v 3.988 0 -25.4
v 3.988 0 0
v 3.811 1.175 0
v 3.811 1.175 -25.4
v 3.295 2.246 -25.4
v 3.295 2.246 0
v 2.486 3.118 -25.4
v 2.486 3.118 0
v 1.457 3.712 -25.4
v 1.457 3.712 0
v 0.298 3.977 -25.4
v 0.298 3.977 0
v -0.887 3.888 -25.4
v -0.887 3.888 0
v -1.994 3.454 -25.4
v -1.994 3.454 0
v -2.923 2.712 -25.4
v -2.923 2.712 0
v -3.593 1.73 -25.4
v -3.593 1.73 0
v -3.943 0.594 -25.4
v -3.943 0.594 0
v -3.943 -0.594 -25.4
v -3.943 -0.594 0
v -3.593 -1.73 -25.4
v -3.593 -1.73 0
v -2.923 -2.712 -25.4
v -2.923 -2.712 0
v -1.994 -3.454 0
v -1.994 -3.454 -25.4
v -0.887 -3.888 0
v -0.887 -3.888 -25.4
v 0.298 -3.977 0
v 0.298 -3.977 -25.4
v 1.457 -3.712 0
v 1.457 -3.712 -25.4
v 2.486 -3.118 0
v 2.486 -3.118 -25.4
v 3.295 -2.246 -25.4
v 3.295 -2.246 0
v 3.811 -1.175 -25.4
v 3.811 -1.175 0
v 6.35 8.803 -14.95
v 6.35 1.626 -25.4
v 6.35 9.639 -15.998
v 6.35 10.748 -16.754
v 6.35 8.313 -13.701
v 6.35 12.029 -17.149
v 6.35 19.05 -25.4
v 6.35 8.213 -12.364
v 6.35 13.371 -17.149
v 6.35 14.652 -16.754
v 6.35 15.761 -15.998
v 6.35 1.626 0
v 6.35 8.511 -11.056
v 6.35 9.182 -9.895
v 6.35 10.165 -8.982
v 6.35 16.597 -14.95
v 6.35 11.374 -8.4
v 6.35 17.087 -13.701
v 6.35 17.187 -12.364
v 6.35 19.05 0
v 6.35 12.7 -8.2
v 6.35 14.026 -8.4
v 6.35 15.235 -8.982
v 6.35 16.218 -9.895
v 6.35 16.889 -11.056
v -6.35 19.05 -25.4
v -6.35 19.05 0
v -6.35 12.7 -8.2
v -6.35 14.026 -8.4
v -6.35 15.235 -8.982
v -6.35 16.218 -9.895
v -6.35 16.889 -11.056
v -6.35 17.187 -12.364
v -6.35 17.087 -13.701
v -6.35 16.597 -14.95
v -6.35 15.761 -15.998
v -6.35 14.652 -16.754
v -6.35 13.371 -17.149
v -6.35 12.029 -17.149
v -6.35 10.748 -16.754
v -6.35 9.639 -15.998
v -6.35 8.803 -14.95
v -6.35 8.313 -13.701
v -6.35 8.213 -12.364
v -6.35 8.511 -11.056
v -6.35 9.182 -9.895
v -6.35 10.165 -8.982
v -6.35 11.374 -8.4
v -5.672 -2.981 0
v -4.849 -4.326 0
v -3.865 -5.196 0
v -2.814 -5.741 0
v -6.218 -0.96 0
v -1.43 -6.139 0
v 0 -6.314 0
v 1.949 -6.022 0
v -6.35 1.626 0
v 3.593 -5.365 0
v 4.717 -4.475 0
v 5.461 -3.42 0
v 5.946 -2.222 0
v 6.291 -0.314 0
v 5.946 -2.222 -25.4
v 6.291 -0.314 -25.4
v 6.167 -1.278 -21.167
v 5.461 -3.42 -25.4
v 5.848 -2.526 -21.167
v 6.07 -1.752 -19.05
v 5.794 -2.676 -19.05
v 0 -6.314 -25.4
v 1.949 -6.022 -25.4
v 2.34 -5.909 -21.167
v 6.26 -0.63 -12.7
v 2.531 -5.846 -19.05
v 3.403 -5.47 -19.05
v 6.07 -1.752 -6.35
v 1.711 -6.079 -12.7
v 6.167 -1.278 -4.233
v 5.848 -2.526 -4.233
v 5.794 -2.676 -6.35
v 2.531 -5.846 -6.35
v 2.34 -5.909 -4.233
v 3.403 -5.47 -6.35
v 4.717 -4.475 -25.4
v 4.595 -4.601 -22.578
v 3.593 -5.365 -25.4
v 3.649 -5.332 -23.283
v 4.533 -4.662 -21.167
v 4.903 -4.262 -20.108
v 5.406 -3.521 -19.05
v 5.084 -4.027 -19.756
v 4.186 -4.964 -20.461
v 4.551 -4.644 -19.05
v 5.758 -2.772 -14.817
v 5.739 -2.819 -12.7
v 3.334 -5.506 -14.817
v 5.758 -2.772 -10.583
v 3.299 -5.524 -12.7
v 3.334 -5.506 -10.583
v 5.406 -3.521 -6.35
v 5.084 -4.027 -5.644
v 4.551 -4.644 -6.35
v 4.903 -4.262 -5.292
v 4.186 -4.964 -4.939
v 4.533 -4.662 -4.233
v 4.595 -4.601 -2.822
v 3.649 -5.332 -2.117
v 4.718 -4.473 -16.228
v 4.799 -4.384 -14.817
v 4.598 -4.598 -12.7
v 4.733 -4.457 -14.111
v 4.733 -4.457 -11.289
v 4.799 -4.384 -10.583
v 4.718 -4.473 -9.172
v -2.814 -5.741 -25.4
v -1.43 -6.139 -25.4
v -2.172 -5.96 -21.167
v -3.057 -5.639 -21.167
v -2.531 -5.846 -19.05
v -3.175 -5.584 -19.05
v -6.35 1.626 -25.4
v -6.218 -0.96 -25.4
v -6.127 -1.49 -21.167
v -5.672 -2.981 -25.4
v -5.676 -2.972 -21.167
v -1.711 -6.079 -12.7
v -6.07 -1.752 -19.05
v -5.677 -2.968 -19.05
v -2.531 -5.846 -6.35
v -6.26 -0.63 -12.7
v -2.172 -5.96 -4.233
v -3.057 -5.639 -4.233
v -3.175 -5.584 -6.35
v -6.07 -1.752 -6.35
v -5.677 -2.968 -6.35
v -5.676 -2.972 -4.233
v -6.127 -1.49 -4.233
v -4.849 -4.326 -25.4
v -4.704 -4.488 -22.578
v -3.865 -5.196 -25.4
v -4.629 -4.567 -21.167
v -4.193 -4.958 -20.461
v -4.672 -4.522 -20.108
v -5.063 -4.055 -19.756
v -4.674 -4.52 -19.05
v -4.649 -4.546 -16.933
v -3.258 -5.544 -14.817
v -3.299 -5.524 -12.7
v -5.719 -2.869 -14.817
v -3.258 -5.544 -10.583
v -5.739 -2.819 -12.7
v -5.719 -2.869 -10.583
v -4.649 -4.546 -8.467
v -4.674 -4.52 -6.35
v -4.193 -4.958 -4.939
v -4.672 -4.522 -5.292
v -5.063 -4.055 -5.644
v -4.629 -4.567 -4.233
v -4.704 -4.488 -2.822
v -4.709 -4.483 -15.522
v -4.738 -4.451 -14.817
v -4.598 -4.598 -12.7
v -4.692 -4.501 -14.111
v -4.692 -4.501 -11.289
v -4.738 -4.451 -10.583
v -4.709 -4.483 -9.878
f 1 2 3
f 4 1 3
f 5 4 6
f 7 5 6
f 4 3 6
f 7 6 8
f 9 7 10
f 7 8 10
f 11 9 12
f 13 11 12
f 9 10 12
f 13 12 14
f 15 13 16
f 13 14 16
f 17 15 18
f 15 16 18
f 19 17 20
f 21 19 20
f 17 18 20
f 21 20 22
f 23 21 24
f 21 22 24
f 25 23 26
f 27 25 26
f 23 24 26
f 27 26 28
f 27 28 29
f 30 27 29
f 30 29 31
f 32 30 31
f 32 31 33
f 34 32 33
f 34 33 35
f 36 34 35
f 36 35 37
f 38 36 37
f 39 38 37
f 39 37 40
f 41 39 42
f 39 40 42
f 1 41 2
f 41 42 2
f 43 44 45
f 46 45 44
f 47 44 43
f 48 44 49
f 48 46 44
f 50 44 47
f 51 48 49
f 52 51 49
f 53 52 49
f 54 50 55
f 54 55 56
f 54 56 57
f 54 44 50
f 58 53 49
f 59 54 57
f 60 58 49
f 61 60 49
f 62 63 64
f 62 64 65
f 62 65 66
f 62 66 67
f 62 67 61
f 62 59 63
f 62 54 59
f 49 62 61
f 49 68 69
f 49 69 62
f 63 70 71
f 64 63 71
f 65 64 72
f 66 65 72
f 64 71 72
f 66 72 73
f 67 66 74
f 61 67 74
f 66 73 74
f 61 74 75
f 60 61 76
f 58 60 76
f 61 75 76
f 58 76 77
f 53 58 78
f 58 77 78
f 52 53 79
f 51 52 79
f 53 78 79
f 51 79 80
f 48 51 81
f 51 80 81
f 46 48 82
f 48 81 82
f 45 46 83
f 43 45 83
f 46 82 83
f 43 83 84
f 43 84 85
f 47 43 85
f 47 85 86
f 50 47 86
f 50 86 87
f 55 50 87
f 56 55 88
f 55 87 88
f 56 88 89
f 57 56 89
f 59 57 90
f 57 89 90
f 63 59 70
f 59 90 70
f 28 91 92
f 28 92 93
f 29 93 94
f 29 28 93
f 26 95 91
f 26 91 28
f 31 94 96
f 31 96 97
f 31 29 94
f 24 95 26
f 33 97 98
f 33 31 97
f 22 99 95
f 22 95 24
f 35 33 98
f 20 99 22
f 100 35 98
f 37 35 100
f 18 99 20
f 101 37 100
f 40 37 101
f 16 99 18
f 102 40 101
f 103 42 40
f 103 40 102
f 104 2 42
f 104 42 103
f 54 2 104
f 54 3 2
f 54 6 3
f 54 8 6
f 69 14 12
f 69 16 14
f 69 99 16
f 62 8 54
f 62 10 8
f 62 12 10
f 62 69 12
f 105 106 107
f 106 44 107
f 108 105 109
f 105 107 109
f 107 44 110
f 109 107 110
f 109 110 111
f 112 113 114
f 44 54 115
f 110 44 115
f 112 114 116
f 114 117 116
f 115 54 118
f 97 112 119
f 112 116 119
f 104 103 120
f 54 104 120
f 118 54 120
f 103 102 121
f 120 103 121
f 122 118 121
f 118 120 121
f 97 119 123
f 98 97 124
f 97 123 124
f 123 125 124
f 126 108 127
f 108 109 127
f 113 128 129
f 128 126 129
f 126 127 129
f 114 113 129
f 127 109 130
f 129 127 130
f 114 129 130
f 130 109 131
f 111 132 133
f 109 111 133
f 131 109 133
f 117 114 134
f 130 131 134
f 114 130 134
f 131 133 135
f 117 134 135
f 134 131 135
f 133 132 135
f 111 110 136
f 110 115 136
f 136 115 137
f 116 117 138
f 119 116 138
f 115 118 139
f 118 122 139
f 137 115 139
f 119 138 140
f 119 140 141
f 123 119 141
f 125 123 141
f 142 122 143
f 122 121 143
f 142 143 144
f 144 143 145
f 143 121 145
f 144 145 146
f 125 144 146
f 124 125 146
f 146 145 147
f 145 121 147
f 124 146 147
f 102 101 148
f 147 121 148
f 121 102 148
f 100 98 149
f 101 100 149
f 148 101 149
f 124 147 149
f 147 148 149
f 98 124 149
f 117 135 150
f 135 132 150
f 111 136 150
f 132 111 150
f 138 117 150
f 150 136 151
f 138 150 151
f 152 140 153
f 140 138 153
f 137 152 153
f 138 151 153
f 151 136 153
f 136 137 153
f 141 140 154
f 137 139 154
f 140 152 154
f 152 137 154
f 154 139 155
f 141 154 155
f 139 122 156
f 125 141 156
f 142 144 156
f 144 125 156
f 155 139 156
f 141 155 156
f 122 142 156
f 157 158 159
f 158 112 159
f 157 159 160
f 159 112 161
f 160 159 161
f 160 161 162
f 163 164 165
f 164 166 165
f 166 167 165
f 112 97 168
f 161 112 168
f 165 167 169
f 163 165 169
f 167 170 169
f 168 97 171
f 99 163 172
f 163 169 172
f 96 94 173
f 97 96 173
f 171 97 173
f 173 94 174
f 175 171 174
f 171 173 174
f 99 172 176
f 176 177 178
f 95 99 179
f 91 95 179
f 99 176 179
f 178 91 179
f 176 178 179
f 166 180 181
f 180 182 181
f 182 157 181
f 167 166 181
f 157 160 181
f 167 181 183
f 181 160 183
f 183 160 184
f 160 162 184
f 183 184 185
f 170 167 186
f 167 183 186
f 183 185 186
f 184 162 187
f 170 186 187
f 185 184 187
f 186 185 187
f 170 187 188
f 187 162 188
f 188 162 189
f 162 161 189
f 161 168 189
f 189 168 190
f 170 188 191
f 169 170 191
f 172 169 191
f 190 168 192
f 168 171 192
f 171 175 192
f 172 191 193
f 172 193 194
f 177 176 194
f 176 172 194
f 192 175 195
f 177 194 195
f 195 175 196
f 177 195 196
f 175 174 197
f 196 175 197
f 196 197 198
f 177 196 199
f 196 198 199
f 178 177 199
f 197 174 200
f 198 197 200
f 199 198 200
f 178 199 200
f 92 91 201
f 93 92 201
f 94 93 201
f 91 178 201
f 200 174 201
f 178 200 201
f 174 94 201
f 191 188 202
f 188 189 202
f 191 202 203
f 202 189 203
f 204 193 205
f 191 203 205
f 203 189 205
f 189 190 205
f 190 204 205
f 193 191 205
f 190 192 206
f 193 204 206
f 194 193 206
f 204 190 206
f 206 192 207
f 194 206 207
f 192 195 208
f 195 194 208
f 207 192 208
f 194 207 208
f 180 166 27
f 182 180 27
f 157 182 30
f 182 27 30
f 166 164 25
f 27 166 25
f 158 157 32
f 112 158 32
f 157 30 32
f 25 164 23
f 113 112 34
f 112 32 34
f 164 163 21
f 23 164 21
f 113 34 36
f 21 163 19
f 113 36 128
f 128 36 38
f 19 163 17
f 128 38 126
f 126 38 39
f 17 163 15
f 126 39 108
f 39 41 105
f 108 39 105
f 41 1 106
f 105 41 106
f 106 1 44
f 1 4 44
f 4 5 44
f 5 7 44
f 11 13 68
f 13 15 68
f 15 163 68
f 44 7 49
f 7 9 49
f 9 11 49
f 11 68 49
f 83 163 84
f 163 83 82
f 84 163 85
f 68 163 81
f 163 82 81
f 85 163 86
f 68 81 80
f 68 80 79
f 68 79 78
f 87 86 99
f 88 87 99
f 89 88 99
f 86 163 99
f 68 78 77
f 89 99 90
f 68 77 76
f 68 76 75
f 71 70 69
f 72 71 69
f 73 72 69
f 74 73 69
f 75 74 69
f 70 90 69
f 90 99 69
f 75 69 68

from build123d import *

# Parameters (mm, degrees)
SKETCH1_W           = 12.7
SKETCH1_H           = 12.7
SKETCH1_R           = 3.9878
BOSS_EXTRUDE1_DEPTH = 25.4
SKETCH2_R           = 4.49961
CUT_EXTRUDE1_DEPTH  = 12.7
FILLET1_SIZE        = 7.9756


with BuildPart() as part:
    # Sketch1 → Boss-Extrude1 (new body)
    # profile 1 of 2: a face of its own
    with BuildSketch(Plane.XY):
        with Locations((0, 12.7)):
            Rectangle(SKETCH1_W, SKETCH1_H)
    # profile 2 of 2: a face of its own
    with BuildSketch(Plane.XY):
        Rectangle(SKETCH1_W, SKETCH1_H)
        Circle(SKETCH1_R, mode=Mode.SUBTRACT)
    extrude(amount=-BOSS_EXTRUDE1_DEPTH)

    # Sketch2 → Cut-Extrude1 (cut)
    with BuildSketch(Plane.ZY.offset(6.35)):
        with Locations((-12.7, 12.7)):
            Circle(SKETCH2_R)
    extrude(amount=-CUT_EXTRUDE1_DEPTH, mode=Mode.SUBTRACT)

    # Fillet1
    # a fillet whose section is not a circle: 7.9756 mm, written as the material it takes off along each edge
    with BuildSketch(Plane(origin=(-6.35, -6.35, 19.939), x_dir=(1, 0, 0), z_dir=(0, 0, -1)), Plane(origin=(6.35, -6.35, 19.939), x_dir=(0, 1, 0), z_dir=(0, 0, -1))) as fillet1_piece_1:
        with BuildLine():
            add(Edge.make_bspline([(FILLET1_SIZE, 0), (FILLET1_SIZE * 0.831801948466, 0), (FILLET1_SIZE * 0.663603896932, 0), (FILLET1_SIZE * 0.292893218813, -FILLET1_SIZE * 0.0716919198361), (FILLET1_SIZE * 0.0716919198361, -FILLET1_SIZE * 0.292893218813), (0, -FILLET1_SIZE * 0.663603896932), (0, -FILLET1_SIZE * 0.831801948466), (0, -FILLET1_SIZE)], knots=[0, 0, 0, 0, 0, 0, 0.5, 0.5, 1, 1, 1, 1, 1, 1], degree=5))
            Line((0, -FILLET1_SIZE), (0, 0))
            Line((0, 0), (FILLET1_SIZE, 0))
        make_face()
    extrude(amount=65.278, mode=Mode.SUBTRACT)


solid = part.part
